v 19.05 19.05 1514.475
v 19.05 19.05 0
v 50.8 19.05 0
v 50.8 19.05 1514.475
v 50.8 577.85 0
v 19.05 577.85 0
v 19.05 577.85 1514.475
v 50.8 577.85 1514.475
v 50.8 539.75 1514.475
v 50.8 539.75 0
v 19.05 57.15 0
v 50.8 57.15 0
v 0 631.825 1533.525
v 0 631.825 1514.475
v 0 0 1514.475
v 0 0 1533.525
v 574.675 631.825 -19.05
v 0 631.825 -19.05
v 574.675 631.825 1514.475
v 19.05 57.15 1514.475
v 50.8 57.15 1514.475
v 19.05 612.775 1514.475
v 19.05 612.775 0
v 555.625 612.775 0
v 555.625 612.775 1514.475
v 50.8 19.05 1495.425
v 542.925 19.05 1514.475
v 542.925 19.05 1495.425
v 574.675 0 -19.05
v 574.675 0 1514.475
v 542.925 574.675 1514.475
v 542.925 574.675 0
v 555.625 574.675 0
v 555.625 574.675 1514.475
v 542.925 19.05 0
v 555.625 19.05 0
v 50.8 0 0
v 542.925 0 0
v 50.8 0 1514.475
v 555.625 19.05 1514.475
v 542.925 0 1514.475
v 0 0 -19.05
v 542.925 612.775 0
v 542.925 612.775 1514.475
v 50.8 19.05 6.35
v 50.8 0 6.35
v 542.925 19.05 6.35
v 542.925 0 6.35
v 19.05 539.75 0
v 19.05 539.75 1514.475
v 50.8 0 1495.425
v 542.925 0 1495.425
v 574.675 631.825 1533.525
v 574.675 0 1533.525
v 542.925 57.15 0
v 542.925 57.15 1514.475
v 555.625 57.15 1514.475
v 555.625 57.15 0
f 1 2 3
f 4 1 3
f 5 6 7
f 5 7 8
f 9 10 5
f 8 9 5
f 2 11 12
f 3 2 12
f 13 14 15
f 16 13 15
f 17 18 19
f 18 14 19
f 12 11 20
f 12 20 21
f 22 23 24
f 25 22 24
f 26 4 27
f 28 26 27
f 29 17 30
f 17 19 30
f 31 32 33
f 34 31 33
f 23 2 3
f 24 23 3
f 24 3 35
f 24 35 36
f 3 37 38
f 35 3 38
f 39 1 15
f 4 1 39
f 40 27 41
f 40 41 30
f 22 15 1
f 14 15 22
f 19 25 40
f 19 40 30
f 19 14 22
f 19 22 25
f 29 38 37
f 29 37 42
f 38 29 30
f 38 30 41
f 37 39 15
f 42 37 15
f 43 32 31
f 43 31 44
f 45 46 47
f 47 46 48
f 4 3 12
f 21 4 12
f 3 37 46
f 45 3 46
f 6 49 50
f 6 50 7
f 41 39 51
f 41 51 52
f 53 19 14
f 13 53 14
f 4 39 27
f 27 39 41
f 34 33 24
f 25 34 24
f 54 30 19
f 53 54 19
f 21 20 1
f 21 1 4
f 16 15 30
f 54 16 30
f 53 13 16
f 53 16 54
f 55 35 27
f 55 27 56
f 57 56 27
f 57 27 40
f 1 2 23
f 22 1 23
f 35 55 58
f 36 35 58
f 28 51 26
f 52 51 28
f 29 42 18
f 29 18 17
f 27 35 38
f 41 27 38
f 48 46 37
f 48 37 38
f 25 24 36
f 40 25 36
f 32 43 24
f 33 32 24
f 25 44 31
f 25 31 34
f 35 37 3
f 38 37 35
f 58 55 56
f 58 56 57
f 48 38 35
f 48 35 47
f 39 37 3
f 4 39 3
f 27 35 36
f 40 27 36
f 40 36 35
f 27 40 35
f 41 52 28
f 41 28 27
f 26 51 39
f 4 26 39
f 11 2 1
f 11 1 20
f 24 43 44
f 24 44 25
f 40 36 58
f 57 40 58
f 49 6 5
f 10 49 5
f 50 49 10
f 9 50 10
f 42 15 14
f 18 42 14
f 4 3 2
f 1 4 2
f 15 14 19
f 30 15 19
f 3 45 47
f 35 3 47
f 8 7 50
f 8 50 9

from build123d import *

# Parameters (mm, degrees)
F1_DEPTH  = 1514.475
F3_DEPTH  = 19.05
F5_DEPTH  = 19.05
F6_W      = 492.125
F6_H      = 6.35
F7_DEPTH  = 19.05
F8_W      = 492.125
F8_H      = 19.05
F9_DEPTH  = 19.05
F10_W     = 12.7
F10_H     = 38.1
F11_DEPTH = 1514.475
F10_W_2   = 31.75


# Not quite as in the source:
# - a feature names something its author has since deleted; it is built from what else it names


with BuildPart() as f1:
    # F0 (on Top) → F1 (new body)
    with BuildSketch(Plane.XY):
        Polygon((0, 631.825), (0, 0), (50.8, 0), (50.8, 19.05), (19.05, 19.05), (19.05, 612.775), (555.625, 612.775), (555.625, 19.05), (542.925, 19.05), (542.925, 0), (574.675, 0), (574.675, 631.825), align=None)
    extrude(amount=F1_DEPTH)

    # F4 (on face) → F5 (join)
    with BuildSketch(Plane(origin=(0, 0, 0), x_dir=(1, 0, 0), z_dir=(0, 0, -1))):
        Polygon((542.925, 0), (50.8, 0), (50.8, -19.05), (19.05, -19.05), (19.05, -612.775), (555.625, -612.775), (555.625, -19.05), (542.925, -19.05), align=None)
        Polygon((50.8, 0), (0, 0), (0, -631.825), (574.675, -631.825), (574.675, 0), (542.925, 0), (542.925, -19.05), (555.625, -19.05), (555.625, -612.775), (19.05, -612.775), (19.05, -19.05), (50.8, -19.05), align=None)
    extrude(amount=F5_DEPTH)


with BuildPart() as f3:
    # F2 (on face) → F3 (new body)
    with BuildSketch(Plane.XY.offset(1514.475)):
        Polygon((574.675, 631.825), (0, 631.825), (0, 0), (50.8, 0), (50.8, 19.05), (19.05, 19.05), (19.05, 612.775), (555.625, 612.775), (555.625, 19.05), (542.925, 19.05), (542.925, 0), (574.675, 0), align=None)
        Polygon((50.8, 19.05), (50.8, 0), (542.925, 0), (542.925, 19.05), (555.625, 19.05), (555.625, 612.775), (19.05, 612.775), (19.05, 19.05), align=None)
    extrude(amount=F3_DEPTH)


with BuildPart() as f7:
    # F6 (on face) → F7 (new body)
    with BuildSketch(Plane.XZ):
        with Locations((296.8625, 3.175)):
            Rectangle(F6_W, F6_H)
    extrude(amount=-F7_DEPTH)


with BuildPart() as f9:
    # F8 (on face) → F9 (new body)
    with BuildSketch(Plane.XZ):
        with Locations((296.8625, 1504.95)):
            Rectangle(F8_W, F8_H)
    extrude(amount=-F9_DEPTH)


with BuildPart() as f11:
    # F10 (on face) → F11 (new body, through all)
    with BuildSketch(Plane.XY):
        with Locations((549.275, 593.725)):
            Rectangle(F10_W, F10_H)
    extrude(amount=F11_DEPTH)


with BuildPart() as f11b:
    # F10 (on face) → F11, piece 2 (new body, through all)
    with BuildSketch(Plane.XY):
        with Locations((549.275, 38.1)):
            Rectangle(F10_W, F10_H)
    extrude(amount=F11_DEPTH)


with BuildPart() as f11c:
    # F10 (on face) → F11, piece 3 (new body, through all)
    with BuildSketch(Plane.XY):
        with Locations((34.925, 38.1)):
            Rectangle(F10_W_2, F10_H)
    extrude(amount=F11_DEPTH)


with BuildPart() as f11d:
    # F10 (on face) → F11, piece 4 (new body, through all)
    with BuildSketch(Plane.XY):
        with Locations((34.925, 558.8)):
            Rectangle(F10_W_2, F10_H)
    extrude(amount=F11_DEPTH)


solid = Compound([f1.part, f3.part, f7.part, f9.part, f11.part, f11b.part, f11c.part, f11d.part])
